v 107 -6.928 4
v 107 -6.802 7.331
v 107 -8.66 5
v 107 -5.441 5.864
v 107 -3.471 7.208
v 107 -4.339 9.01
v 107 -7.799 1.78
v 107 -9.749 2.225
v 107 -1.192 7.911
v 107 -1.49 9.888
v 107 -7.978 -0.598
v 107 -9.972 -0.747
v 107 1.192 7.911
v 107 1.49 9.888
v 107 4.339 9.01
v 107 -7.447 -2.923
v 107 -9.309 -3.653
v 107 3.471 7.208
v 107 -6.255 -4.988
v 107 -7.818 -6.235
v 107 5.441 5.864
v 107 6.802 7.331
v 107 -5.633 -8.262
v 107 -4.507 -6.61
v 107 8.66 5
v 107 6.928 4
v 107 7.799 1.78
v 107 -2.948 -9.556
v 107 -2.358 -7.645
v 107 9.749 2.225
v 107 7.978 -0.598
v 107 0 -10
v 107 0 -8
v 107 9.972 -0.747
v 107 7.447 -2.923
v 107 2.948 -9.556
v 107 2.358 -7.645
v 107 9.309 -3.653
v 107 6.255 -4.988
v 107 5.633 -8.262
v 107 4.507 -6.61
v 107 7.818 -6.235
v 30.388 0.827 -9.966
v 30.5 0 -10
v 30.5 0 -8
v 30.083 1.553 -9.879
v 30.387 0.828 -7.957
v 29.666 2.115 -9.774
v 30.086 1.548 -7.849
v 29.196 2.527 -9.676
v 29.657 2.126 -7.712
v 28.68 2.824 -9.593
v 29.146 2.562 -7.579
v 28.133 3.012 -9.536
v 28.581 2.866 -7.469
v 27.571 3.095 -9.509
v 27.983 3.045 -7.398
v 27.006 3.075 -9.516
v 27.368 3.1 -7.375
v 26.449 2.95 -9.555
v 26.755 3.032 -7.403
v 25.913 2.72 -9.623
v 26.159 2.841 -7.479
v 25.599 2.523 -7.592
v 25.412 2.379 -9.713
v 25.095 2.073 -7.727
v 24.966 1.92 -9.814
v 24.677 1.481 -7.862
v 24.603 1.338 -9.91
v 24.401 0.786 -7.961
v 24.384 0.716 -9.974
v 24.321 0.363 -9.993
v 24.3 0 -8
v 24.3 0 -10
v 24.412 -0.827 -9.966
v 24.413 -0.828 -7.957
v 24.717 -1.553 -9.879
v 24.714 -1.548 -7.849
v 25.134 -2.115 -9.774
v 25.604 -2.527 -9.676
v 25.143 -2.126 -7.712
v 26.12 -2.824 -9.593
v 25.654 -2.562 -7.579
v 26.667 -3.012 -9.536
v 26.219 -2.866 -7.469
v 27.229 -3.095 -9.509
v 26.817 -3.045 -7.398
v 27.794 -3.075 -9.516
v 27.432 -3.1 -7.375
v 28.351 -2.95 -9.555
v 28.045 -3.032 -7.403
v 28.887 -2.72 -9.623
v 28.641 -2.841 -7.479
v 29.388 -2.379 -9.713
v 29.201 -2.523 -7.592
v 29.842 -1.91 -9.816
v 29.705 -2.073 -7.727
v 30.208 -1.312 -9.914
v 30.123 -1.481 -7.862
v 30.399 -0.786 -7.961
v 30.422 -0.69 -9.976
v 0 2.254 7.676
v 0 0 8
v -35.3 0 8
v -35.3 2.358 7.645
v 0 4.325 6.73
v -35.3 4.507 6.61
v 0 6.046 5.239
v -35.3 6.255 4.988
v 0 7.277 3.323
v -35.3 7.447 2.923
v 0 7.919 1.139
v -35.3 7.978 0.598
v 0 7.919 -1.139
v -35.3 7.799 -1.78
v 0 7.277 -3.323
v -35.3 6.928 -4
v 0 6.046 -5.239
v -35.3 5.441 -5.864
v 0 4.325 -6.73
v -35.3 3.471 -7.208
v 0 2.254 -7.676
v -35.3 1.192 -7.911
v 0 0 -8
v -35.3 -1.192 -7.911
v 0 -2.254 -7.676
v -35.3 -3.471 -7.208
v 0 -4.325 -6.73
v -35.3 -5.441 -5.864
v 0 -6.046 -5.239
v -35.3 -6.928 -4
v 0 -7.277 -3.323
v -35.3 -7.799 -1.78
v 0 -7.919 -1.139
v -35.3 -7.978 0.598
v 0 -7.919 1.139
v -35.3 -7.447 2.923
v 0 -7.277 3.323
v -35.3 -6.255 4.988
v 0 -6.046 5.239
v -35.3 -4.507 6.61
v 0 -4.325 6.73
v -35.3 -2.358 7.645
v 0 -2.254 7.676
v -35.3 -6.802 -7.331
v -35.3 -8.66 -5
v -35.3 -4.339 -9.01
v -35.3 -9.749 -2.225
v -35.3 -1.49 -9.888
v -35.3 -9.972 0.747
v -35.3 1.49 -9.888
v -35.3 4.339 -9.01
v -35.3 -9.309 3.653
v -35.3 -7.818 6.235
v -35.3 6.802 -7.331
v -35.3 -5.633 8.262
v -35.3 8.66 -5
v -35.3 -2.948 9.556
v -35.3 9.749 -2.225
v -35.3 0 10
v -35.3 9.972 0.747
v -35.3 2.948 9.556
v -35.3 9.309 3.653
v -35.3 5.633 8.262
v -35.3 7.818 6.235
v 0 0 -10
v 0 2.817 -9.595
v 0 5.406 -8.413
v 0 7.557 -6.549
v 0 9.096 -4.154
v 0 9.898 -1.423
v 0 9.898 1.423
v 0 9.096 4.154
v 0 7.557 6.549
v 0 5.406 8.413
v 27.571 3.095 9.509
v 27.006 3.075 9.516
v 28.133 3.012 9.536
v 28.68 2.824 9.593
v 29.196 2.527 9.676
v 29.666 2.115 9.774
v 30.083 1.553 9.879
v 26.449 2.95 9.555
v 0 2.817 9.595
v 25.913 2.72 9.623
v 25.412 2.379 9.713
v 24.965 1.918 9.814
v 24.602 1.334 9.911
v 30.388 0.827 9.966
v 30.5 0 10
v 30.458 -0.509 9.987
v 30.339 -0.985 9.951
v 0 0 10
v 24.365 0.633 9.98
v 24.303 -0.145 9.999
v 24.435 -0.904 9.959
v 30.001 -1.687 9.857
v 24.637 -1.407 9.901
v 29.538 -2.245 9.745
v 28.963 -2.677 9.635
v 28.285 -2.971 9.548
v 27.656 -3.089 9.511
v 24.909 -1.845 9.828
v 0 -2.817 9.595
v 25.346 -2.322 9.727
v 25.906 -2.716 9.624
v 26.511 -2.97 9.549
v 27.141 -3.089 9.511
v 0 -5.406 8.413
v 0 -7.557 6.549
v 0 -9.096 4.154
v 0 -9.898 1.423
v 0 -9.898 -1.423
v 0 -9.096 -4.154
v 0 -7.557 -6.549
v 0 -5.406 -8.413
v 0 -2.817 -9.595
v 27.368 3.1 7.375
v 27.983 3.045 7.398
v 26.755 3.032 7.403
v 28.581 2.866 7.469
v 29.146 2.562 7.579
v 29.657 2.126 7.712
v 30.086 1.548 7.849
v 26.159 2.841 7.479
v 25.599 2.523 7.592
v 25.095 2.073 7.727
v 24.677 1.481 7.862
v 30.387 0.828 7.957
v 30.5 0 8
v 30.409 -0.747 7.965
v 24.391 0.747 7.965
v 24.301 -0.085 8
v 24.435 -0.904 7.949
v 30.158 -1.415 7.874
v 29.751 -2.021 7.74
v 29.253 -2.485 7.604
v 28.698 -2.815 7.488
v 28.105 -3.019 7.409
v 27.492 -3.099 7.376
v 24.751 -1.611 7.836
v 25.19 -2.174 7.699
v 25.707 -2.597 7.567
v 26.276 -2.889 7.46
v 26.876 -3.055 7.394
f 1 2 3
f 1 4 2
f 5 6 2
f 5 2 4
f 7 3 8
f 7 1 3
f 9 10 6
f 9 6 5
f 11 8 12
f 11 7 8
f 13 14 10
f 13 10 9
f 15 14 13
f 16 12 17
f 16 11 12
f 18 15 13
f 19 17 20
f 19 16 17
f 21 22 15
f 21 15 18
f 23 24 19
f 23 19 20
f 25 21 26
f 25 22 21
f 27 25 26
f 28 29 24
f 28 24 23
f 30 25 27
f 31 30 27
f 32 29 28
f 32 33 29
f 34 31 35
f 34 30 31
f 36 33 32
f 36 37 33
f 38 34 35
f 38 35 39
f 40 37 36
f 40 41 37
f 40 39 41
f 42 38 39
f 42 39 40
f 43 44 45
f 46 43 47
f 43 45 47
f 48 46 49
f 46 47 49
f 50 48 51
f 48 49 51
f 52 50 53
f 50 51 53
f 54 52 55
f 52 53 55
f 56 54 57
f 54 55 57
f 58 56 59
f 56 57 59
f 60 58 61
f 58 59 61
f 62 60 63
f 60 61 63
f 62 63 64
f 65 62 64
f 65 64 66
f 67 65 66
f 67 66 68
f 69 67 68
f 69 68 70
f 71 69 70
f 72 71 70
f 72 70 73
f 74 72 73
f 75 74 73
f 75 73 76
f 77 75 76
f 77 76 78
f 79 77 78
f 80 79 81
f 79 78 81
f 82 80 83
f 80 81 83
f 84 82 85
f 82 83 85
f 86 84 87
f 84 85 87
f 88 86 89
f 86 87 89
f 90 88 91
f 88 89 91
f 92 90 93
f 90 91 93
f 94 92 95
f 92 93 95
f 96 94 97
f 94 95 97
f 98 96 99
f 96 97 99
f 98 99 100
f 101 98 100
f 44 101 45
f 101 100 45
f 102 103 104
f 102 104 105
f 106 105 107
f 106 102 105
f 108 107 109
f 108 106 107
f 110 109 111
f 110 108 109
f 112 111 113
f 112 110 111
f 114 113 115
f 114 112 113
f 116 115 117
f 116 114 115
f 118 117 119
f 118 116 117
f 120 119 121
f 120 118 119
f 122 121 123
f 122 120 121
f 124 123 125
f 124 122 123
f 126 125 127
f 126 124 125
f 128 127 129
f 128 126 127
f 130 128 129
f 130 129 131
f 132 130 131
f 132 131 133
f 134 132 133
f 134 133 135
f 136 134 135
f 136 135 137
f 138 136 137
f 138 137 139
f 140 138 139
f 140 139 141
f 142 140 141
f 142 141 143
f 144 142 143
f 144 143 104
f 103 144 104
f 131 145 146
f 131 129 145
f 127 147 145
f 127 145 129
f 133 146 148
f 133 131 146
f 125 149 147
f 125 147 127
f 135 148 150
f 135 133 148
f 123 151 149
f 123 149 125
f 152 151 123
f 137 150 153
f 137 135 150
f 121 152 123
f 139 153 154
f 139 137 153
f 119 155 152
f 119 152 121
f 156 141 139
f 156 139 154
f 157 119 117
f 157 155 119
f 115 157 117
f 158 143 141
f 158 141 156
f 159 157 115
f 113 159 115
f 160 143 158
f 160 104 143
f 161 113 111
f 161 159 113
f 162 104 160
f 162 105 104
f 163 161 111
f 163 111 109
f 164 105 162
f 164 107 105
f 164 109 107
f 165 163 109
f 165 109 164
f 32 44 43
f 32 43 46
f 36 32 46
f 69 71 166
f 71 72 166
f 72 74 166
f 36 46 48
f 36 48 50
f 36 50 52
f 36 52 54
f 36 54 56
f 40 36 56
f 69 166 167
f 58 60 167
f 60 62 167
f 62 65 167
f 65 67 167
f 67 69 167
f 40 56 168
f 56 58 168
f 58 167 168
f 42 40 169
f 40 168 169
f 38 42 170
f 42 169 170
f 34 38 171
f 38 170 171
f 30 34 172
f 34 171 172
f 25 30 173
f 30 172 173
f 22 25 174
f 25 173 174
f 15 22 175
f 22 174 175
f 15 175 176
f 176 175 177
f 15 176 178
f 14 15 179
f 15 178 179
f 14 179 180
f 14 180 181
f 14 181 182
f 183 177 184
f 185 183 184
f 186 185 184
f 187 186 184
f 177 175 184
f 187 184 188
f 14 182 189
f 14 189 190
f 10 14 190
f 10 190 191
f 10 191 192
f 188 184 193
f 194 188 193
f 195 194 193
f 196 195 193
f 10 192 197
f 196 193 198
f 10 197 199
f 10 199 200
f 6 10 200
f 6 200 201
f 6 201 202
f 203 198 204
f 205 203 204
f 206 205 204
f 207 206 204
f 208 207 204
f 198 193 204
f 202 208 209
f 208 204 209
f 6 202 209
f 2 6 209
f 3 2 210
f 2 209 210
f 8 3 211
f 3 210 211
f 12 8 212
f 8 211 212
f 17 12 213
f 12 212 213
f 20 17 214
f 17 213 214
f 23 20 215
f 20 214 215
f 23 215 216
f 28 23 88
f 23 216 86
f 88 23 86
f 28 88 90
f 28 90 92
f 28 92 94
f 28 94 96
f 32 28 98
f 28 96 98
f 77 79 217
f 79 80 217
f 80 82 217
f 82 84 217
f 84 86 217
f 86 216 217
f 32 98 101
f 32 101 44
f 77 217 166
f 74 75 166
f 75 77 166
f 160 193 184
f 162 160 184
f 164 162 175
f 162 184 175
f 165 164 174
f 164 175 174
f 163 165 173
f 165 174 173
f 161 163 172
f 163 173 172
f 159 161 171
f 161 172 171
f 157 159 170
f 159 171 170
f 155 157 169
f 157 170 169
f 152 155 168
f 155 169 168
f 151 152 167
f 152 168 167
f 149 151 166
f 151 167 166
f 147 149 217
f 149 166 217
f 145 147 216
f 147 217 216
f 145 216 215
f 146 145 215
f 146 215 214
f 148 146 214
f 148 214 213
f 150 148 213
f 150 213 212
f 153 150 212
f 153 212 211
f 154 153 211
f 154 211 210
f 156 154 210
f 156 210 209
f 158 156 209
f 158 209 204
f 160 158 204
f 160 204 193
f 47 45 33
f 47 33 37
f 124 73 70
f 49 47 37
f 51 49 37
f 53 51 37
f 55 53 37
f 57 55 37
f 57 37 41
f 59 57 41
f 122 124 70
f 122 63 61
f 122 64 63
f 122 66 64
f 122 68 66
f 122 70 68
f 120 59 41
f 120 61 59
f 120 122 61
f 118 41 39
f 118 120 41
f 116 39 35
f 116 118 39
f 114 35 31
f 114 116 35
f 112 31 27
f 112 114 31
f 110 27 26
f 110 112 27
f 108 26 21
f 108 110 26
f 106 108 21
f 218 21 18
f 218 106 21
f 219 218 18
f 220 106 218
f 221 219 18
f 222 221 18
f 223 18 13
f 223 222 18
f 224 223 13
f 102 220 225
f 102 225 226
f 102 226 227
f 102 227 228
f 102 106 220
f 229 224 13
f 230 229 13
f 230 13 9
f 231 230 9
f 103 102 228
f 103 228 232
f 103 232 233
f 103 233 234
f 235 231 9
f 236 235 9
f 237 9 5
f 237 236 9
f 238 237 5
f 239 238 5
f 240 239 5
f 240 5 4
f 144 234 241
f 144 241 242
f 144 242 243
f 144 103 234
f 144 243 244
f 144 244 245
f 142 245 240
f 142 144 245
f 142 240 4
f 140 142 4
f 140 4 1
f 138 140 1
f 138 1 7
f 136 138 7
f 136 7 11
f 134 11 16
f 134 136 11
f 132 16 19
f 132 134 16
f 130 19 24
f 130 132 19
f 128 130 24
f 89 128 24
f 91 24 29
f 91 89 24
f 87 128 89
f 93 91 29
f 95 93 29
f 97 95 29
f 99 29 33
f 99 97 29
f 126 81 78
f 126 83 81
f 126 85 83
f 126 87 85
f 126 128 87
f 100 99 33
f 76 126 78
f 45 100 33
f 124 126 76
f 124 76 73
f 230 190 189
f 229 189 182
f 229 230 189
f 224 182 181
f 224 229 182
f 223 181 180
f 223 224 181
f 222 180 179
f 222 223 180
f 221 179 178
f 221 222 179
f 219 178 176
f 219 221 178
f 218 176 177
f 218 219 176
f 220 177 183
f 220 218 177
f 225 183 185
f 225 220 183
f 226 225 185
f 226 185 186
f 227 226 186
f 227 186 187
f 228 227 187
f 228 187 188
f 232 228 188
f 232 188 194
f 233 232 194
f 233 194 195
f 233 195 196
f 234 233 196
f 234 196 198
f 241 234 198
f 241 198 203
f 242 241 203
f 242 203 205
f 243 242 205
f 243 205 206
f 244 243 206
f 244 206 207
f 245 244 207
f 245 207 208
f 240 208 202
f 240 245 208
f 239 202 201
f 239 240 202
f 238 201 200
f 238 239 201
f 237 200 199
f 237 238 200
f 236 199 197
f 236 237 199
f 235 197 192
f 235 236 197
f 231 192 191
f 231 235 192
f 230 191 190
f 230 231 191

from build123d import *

# Parameters (mm, degrees)
SKETCH_1_R              = 10
SKETCH_1_R_2            = 8
EXTRUDE_1_DEPTH         = 107
SKETCH_2_R              = 10
SKETCH_2_R_2            = 8
EXTRUDE_2_DEPTH         = 35.3
SKETCH2_R               = 3.1
CUT_EXTRUDE2_DEPTH      = 11
CUT_EXTRUDE2_DEPTH_BACK = 11


with BuildPart() as part:
    # 草图1 → 凸台-拉伸1 (new body)
    with BuildSketch(Plane(origin=(0, 0, 0), x_dir=(0, 0, -1), z_dir=(1, 0, 0))):
        Circle(SKETCH_1_R)
        Circle(SKETCH_1_R_2, mode=Mode.SUBTRACT)
    extrude(amount=EXTRUDE_1_DEPTH)

    # 草图2 → 凸台-拉伸2 (add)
    with BuildSketch(Plane.ZY):
        Circle(SKETCH_2_R)
        Circle(SKETCH_2_R_2, mode=Mode.SUBTRACT)
    extrude(amount=EXTRUDE_2_DEPTH)

    # Sketch2 → Cut-Extrude2 (cut, two sides)
    with BuildSketch(Plane.XY) as cut_extrude2_sk:
        with Locations((27.4, 0)):
            Circle(SKETCH2_R)
    extrude(amount=CUT_EXTRUDE2_DEPTH, mode=Mode.SUBTRACT)
    extrude(cut_extrude2_sk.sketch, amount=-CUT_EXTRUDE2_DEPTH_BACK, mode=Mode.SUBTRACT)


solid = part.part
